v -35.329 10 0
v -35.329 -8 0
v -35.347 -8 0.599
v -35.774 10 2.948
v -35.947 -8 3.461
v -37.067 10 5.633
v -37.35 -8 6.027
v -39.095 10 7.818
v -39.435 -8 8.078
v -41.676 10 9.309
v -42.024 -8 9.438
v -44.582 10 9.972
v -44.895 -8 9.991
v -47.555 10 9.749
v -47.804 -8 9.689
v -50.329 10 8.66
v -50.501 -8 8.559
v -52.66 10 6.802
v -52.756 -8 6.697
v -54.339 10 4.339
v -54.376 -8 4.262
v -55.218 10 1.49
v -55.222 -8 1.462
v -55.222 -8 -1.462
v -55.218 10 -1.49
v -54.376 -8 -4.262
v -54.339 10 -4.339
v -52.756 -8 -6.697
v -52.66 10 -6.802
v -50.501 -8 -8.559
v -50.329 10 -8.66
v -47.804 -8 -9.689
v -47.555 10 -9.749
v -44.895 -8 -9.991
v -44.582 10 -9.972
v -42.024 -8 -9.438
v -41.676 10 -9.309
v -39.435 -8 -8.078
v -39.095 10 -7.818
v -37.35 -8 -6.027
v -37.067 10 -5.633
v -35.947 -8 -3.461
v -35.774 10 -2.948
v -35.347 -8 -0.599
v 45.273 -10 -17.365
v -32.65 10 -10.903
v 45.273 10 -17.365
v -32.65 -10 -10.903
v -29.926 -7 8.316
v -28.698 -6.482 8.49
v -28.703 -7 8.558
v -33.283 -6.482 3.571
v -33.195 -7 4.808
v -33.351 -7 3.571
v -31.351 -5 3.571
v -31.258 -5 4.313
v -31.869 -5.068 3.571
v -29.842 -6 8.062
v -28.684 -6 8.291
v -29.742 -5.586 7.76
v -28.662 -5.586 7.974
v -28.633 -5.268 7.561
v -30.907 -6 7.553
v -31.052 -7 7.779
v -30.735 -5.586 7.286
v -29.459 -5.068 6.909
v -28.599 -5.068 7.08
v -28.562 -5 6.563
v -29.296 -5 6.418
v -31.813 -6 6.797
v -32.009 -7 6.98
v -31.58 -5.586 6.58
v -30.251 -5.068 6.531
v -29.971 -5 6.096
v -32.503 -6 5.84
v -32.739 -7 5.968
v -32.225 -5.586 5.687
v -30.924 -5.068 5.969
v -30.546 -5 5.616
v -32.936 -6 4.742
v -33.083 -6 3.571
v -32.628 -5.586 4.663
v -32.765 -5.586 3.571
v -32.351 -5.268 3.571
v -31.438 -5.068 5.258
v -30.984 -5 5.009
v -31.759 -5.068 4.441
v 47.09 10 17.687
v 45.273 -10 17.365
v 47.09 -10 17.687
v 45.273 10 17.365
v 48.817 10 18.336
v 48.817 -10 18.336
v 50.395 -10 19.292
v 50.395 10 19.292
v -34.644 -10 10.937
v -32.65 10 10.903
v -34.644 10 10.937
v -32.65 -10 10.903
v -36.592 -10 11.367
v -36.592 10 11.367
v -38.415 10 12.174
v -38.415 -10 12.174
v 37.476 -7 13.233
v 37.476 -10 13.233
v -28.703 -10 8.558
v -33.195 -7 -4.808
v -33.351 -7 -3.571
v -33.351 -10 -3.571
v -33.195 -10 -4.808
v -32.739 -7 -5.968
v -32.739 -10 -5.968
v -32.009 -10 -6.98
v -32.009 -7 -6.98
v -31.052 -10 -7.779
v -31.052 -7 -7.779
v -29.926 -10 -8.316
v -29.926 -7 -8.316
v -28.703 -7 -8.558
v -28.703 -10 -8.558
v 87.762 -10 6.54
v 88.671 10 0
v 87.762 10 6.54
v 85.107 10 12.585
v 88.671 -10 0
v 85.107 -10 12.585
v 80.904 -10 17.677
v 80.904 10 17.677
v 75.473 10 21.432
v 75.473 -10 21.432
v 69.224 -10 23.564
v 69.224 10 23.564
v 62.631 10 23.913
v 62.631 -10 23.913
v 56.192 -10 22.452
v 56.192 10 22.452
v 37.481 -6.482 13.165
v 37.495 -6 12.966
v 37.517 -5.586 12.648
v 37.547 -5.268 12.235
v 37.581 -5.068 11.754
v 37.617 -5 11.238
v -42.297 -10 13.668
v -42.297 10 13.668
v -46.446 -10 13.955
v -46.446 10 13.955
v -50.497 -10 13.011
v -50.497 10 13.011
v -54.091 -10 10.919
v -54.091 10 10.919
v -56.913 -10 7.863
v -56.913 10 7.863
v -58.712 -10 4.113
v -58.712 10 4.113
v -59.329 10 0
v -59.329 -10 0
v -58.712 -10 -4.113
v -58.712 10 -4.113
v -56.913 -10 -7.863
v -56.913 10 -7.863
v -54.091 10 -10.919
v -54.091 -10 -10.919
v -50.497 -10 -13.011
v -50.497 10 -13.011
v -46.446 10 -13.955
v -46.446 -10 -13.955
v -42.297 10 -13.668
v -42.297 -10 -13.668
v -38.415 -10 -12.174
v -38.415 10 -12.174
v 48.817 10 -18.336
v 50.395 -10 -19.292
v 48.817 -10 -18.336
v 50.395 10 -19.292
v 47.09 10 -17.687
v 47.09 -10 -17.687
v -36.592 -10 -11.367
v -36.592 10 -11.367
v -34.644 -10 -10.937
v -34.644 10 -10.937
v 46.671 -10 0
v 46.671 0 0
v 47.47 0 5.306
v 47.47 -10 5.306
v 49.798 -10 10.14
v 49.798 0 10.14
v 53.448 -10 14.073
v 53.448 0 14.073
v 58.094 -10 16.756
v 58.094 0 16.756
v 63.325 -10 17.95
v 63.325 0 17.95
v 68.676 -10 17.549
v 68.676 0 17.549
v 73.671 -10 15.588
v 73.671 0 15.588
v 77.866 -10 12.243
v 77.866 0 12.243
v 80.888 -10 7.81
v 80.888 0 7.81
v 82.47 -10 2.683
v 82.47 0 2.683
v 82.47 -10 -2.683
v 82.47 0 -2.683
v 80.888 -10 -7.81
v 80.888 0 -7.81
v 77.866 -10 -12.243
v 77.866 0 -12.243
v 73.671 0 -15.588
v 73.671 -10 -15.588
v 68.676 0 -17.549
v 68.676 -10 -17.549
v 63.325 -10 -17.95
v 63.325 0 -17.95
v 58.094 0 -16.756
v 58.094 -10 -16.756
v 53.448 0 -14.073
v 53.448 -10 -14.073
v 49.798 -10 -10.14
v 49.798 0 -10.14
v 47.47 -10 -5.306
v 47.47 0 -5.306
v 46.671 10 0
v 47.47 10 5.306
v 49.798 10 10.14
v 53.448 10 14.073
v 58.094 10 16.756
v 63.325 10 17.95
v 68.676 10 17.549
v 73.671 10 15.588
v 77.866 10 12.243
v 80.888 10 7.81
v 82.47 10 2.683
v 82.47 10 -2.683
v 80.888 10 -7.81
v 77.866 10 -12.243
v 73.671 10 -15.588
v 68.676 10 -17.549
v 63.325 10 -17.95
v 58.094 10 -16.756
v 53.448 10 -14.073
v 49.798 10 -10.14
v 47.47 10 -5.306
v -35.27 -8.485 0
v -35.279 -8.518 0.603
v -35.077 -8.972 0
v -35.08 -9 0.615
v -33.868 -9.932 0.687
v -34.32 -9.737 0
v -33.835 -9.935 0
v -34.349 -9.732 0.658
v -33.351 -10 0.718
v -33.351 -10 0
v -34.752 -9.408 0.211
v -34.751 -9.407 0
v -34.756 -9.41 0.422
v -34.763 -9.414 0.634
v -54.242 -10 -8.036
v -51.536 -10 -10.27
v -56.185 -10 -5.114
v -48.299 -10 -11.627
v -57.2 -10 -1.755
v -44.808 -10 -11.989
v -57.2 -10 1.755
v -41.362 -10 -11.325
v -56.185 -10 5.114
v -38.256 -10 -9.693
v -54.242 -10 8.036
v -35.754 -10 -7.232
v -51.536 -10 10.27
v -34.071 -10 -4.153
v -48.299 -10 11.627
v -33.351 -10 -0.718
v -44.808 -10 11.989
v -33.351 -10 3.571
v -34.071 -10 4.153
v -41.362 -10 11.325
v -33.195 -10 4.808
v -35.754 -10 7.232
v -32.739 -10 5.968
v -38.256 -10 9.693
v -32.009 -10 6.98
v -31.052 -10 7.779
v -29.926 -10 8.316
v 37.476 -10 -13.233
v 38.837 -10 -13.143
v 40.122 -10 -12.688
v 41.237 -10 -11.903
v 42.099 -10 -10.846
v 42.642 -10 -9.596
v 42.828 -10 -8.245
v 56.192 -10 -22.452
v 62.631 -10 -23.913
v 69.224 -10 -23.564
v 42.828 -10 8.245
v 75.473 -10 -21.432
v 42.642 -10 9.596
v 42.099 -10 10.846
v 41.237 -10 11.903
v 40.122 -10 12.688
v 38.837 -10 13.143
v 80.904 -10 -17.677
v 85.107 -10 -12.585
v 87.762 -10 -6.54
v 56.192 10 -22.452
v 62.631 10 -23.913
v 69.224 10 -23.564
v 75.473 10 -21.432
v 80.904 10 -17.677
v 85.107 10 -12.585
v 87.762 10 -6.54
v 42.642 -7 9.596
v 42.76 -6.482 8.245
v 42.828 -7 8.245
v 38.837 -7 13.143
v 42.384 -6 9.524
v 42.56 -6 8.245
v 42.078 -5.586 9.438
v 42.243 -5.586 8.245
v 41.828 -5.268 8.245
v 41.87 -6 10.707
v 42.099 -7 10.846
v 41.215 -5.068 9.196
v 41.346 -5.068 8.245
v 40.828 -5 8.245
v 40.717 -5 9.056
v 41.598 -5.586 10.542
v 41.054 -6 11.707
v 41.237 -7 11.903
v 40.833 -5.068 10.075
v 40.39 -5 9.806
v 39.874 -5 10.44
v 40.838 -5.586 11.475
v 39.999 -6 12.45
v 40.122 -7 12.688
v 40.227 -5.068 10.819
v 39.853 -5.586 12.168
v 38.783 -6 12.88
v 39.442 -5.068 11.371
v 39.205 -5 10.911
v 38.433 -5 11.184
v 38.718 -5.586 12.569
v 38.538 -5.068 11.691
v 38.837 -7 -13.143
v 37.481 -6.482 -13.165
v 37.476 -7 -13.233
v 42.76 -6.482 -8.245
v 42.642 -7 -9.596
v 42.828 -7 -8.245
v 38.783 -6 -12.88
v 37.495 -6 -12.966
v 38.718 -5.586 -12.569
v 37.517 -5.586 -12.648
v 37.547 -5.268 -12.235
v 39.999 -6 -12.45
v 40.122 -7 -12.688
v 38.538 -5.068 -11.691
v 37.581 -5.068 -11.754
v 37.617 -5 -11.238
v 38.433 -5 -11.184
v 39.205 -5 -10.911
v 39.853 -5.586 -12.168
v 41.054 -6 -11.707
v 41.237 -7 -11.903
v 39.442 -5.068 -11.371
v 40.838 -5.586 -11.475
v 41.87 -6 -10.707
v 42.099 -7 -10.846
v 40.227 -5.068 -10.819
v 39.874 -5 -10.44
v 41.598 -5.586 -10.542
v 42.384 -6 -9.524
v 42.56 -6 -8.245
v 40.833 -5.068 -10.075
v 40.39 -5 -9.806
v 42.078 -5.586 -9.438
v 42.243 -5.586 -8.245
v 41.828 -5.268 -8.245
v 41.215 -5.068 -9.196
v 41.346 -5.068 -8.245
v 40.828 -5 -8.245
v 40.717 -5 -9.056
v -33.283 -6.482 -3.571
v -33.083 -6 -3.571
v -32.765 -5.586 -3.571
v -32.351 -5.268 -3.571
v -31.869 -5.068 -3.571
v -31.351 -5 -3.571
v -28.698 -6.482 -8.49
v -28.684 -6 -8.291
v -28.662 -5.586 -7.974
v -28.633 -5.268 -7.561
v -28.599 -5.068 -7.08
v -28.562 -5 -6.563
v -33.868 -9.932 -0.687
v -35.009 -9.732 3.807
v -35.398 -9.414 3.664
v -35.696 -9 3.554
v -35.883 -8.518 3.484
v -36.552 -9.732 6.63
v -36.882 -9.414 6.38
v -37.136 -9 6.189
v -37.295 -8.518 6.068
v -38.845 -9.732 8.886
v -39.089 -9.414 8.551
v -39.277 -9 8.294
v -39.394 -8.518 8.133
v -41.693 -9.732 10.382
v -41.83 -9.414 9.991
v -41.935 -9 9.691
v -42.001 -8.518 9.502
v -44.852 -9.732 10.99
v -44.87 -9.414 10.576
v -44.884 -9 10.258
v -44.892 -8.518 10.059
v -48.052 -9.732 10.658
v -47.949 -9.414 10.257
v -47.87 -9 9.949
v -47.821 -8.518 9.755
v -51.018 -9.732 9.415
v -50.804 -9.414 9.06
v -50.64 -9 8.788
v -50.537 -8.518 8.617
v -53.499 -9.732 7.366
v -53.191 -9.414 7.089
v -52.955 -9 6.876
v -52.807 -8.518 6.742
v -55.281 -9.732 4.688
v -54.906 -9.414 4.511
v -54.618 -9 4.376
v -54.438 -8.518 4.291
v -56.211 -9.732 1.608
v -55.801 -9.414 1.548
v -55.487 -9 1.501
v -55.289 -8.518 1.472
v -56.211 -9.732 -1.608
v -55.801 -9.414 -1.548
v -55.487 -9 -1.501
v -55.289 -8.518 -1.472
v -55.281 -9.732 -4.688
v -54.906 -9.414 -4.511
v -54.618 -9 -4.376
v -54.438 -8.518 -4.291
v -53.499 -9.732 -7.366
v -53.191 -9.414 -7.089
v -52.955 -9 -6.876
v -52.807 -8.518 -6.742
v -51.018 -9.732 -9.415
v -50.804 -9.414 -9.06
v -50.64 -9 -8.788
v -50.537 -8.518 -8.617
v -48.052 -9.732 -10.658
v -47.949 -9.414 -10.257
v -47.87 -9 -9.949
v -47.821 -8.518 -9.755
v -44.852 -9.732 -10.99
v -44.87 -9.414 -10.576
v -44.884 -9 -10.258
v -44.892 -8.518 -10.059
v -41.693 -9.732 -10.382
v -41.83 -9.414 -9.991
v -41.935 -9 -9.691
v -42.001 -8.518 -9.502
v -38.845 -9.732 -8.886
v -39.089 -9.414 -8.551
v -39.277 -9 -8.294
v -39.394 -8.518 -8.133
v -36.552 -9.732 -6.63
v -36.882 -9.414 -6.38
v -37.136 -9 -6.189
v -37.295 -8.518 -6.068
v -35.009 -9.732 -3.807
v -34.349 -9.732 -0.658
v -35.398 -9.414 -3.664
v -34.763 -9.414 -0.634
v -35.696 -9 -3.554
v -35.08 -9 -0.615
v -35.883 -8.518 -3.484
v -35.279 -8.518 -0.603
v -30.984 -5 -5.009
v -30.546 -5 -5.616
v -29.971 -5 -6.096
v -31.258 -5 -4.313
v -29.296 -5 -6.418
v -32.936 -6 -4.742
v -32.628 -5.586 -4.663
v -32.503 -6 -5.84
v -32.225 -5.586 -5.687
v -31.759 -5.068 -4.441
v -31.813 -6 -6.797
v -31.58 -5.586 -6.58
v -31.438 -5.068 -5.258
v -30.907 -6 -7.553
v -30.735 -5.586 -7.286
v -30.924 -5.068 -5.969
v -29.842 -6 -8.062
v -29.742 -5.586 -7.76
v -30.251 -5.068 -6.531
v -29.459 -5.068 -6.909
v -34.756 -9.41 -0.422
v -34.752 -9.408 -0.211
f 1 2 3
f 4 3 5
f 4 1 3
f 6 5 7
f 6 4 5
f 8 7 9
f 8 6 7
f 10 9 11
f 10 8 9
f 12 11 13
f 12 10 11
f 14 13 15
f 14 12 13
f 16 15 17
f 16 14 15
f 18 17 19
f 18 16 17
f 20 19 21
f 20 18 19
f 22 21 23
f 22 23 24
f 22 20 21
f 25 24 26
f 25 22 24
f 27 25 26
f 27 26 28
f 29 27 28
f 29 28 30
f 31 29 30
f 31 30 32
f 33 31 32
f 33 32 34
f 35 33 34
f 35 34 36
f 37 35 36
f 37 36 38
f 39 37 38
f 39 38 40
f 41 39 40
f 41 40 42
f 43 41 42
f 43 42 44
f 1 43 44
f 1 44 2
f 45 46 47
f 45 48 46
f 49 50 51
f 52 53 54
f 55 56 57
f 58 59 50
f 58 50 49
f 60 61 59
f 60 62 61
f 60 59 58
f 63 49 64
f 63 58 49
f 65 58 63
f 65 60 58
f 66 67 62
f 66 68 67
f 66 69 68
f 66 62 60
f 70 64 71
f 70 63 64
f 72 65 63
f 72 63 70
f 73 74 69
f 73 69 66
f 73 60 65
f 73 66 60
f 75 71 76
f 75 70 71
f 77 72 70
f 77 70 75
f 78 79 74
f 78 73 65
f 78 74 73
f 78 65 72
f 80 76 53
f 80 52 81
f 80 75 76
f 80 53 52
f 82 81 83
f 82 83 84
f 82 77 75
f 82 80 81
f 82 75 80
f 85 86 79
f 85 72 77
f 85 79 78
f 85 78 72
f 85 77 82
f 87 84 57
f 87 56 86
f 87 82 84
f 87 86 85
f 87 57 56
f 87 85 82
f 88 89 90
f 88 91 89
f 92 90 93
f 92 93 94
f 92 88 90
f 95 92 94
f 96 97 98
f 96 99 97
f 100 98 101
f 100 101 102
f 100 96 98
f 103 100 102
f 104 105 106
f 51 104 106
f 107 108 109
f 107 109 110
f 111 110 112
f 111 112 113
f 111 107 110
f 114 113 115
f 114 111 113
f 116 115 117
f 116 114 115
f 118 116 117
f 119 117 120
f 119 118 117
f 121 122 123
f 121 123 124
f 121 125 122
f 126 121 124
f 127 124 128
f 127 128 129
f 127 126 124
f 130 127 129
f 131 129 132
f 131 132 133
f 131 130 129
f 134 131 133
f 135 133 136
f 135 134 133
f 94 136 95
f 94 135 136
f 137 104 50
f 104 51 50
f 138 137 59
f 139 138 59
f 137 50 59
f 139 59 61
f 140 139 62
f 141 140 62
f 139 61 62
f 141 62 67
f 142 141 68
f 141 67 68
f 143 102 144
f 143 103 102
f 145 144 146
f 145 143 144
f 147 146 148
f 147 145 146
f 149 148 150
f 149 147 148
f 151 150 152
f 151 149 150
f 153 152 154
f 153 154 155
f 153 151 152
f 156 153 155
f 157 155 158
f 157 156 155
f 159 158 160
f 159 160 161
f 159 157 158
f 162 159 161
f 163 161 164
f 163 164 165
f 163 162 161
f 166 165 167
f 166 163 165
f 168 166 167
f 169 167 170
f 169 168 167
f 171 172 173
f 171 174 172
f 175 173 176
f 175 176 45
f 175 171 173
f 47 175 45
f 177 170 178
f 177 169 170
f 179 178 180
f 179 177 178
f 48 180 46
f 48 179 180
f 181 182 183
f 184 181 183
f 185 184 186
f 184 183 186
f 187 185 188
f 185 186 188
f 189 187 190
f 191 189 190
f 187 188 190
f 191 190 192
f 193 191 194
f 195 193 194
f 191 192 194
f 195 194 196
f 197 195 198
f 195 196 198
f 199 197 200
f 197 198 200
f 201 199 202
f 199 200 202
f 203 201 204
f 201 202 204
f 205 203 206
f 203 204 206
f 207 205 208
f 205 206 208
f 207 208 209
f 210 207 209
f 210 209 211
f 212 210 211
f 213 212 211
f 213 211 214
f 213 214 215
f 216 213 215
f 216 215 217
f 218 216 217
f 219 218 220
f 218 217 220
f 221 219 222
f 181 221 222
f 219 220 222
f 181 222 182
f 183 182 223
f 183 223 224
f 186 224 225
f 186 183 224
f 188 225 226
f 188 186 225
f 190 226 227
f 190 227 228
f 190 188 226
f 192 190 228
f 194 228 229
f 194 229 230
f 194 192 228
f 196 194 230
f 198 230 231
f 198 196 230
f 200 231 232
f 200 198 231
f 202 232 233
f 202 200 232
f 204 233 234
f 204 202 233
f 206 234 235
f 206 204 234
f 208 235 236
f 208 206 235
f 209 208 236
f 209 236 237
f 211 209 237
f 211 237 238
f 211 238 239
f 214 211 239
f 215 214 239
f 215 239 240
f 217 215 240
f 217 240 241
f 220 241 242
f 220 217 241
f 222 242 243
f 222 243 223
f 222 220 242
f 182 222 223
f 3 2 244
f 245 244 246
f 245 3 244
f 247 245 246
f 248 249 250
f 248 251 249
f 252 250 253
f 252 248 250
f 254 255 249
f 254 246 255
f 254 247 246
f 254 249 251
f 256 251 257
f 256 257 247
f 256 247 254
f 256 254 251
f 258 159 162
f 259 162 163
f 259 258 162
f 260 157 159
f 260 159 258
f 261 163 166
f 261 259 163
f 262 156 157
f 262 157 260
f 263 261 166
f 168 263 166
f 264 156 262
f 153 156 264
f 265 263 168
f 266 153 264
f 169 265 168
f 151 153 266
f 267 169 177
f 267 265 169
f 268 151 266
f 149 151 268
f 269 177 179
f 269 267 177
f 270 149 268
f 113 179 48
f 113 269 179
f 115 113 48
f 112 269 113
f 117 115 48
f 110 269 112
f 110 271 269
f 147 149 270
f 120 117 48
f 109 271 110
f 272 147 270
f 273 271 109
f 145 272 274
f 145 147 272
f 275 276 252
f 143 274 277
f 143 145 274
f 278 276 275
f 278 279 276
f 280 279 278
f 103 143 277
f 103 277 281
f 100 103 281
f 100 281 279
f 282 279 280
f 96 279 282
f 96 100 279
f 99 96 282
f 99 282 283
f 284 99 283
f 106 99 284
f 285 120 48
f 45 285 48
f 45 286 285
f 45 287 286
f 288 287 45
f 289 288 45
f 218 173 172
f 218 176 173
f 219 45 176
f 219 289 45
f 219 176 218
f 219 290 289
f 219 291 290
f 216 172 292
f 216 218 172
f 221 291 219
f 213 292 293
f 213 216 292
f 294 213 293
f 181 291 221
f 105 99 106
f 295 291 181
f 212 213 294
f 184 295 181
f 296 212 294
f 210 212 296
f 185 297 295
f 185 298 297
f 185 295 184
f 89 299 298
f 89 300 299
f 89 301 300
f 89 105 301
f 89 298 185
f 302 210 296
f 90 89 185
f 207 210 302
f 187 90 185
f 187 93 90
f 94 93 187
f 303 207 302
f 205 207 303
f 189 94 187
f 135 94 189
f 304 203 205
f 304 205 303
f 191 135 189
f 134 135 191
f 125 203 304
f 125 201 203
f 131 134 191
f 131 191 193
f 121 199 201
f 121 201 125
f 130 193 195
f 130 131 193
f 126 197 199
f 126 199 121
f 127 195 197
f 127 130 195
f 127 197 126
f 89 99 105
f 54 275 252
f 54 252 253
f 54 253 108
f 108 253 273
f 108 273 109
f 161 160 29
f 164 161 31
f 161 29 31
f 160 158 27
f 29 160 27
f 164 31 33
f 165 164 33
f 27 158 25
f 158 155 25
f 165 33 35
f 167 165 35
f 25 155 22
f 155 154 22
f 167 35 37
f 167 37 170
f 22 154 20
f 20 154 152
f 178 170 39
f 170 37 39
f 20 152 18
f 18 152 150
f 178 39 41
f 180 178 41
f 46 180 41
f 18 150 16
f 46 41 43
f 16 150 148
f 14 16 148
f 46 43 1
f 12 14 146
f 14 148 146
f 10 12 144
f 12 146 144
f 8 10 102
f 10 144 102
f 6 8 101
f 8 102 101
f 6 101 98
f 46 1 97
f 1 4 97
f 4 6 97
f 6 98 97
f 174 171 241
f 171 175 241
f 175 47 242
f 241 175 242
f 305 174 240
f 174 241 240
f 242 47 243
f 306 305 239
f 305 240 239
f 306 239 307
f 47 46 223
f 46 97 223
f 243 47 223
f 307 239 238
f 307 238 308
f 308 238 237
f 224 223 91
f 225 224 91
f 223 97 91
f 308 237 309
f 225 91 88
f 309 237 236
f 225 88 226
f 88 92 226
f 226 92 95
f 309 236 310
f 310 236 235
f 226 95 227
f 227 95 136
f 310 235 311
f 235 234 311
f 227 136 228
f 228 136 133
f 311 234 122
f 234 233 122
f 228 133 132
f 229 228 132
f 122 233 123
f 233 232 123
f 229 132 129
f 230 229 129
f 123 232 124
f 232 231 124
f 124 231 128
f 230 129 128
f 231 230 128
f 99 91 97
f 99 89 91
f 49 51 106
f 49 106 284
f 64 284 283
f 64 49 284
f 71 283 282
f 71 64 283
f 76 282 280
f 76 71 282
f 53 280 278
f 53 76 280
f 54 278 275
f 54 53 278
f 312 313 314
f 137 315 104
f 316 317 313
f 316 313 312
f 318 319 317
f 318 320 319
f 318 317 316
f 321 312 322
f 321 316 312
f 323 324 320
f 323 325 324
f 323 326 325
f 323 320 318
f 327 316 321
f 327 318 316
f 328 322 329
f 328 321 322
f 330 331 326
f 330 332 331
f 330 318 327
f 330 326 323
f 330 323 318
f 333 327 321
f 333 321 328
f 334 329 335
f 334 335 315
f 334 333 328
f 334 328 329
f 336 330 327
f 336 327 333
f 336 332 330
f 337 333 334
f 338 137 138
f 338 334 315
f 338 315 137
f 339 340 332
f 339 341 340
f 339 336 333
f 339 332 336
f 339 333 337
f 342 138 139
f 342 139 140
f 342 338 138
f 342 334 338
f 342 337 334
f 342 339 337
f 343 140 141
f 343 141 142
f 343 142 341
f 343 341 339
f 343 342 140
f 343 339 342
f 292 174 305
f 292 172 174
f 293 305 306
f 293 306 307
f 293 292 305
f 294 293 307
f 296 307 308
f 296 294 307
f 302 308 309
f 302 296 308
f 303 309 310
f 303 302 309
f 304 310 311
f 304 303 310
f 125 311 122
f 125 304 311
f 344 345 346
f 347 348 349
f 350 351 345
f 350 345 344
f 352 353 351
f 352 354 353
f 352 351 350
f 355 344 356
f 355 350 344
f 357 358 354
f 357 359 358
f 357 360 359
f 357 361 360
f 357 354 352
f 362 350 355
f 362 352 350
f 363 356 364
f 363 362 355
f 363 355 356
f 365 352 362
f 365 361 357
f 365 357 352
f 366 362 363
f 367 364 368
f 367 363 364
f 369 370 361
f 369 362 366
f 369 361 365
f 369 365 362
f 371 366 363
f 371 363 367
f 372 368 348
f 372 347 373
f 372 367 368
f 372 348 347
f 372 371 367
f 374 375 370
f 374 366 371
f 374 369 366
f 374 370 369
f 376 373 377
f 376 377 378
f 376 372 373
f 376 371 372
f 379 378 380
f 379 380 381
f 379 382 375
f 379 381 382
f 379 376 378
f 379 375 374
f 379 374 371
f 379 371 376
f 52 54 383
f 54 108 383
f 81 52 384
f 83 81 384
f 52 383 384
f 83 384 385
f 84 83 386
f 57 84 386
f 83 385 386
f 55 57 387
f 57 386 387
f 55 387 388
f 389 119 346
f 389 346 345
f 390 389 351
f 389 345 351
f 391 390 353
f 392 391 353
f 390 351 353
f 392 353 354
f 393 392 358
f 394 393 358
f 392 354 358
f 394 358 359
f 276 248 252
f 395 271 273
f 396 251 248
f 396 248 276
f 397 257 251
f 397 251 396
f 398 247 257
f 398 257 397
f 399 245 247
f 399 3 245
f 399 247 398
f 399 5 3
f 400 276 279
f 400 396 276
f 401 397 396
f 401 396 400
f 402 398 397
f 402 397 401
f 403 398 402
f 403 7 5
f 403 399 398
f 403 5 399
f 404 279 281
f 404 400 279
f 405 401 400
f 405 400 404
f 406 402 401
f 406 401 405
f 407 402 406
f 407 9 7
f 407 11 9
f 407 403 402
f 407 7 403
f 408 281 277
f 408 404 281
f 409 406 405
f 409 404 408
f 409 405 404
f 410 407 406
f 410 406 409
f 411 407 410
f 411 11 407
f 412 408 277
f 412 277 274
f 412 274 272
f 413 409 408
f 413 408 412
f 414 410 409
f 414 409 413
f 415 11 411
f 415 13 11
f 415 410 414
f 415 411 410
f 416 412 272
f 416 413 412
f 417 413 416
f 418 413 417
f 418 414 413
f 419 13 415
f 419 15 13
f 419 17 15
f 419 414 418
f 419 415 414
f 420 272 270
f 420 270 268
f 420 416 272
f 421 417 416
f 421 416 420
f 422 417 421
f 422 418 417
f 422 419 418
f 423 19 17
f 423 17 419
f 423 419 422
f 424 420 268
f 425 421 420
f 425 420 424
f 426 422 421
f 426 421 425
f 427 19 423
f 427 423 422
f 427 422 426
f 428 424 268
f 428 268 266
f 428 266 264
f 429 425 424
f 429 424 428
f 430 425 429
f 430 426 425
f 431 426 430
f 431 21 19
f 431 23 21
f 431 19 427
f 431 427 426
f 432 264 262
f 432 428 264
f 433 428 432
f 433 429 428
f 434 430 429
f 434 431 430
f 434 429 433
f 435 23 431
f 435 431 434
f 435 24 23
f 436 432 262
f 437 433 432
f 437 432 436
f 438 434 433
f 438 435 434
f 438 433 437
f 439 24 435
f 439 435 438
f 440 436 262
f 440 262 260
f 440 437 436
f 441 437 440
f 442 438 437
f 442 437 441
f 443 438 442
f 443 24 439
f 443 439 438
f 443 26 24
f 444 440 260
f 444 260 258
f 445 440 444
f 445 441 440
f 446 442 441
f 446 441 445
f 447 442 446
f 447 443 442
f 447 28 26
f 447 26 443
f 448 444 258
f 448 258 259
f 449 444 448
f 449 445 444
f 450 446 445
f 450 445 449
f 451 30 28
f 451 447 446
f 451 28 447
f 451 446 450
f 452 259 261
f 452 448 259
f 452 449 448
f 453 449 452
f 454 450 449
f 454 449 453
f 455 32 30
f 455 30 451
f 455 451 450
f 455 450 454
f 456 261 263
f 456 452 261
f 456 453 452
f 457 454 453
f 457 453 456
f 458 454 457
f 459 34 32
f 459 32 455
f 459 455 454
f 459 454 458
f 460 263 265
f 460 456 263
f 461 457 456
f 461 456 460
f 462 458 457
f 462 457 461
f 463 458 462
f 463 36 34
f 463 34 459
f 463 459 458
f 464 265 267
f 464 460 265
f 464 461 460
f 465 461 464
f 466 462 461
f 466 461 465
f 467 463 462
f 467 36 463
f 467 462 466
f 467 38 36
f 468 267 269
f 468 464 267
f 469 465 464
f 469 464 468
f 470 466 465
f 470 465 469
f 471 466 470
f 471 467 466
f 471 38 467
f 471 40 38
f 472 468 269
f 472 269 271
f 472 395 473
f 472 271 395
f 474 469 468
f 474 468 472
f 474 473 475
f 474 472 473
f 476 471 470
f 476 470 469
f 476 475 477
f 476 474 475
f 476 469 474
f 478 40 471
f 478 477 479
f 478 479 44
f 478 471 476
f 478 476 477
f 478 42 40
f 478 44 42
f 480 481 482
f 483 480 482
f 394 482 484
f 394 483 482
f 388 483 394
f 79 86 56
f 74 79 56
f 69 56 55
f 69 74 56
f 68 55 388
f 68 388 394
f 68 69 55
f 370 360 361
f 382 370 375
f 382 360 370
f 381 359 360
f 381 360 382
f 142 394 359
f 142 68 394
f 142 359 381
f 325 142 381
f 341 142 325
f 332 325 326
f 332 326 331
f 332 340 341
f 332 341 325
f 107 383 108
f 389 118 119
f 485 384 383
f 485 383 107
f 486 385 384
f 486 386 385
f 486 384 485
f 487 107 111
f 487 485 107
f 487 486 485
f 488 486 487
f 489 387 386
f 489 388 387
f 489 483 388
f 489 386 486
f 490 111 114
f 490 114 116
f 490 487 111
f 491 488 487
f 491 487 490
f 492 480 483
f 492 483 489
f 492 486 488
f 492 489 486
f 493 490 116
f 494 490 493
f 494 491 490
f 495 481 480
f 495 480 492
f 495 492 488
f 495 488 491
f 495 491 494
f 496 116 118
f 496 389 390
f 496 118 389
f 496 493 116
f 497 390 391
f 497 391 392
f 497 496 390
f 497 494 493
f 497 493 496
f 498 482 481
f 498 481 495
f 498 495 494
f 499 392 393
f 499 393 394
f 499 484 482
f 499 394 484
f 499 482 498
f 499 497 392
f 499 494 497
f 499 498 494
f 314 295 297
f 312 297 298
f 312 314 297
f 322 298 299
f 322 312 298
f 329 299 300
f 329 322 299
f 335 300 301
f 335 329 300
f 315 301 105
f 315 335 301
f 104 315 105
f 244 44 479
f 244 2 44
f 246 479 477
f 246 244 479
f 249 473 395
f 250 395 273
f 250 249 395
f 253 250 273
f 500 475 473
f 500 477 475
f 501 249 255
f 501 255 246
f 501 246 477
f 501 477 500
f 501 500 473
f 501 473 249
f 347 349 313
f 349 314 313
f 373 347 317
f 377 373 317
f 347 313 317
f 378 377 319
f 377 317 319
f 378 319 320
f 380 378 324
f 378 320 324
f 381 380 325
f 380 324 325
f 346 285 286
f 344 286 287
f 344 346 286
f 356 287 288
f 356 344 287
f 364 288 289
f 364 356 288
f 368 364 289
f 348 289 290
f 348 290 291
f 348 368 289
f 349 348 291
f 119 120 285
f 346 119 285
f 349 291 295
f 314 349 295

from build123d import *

# Parameters (mm, degrees)
F0_R     = 10
F1_DEPTH = 10
F2_R     = 10
F3_R     = 10
F5_DEPTH = 5
F6_R     = 5
F7_R     = 5
F8_R     = 2


with BuildPart() as f1:
    # F0 (on Front) → F1 (new body, symmetric)
    with BuildSketch(Plane.XZ):
        with BuildLine():
            ThreePointArc((-36.194757, 10.609343), (-32.603742, 5.835876), (-31.329407, 0))
            Line((-31.329407, 0), (40.670593, 0))
            ThreePointArc((40.670593, 0), (42.681766, 9.617248), (48.378215, 17.622667))
            Line((48.378215, 17.622667), (-36.194757, 10.609343))
        make_face()
        with BuildLine():
            Line((40.670593, 0), (-31.329407, 0))
            ThreePointArc((-31.329407, 0), (-32.603742, -5.835876), (-36.194757, -10.609343))
            Line((-36.194757, -10.609343), (48.378215, -17.622667))
            ThreePointArc((48.378215, -17.622667), (42.681766, -9.617248), (40.670593, 0))
        make_face()
        with BuildLine():
            ThreePointArc((48.378215, 17.622667), (42.681766, 9.617248), (40.670593, 0))
            ThreePointArc((40.670593, 0), (42.681766, -9.617248), (48.378215, -17.622667))
            ThreePointArc((48.378215, -17.622667), (74.287841, -21.988828), (88.670593, 0))
            ThreePointArc((88.670593, 0), (74.287841, 21.988828), (48.378215, 17.622667))
        make_face()
        with BuildLine():
            ThreePointArc((82.670593, 0), (64.670593, -18), (46.670593, 0))
            ThreePointArc((46.670593, 0), (64.670593, 18), (82.670593, 0))
        make_face(mode=Mode.SUBTRACT)
        with BuildLine():
            ThreePointArc((-36.194757, -10.609343), (-32.603742, -5.835876), (-31.329407, 0))
            ThreePointArc((-31.329407, 0), (-32.603742, 5.835876), (-36.194757, 10.609343))
            ThreePointArc((-36.194757, 10.609343), (-59.329407, 0), (-36.194757, -10.609343))
        make_face()
        with Locations((-45.329407, 0)):
            Circle(F0_R, mode=Mode.SUBTRACT)
    extrude(amount=F1_DEPTH, both=True)

    # F2
    f2_edges = [f1.edges().sort_by_distance(p)[0] for p in [
        (-36.194757, 0, 10.609343),
    ]]
    fillet(f2_edges, radius=F2_R)

    # F3
    f3_edges = [f1.edges().sort_by_distance(p)[0] for p in [
        (48.378215, 5, 17.622667),
        (48.378215, 5, -17.622667),
        (-36.194757, 0, -10.609343),
    ]]
    fillet(f3_edges, radius=F3_R)

    # F4 (on face) → F5 (cut)
    with BuildSketch(Plane.XZ.offset(10)):
        Polygon((42.828392, 13.610834), (-33.350925, 8.230139), (-33.350925, -8.230139), (42.828392, -13.610834), align=None)
    extrude(amount=-F5_DEPTH, mode=Mode.SUBTRACT)

    # F6
    f6_edges = [f1.edges().sort_by_distance(p)[0] for p in [
        (-33.350925, -7.5, 8.230139),
        (-33.350925, -7.5, -8.230139),
    ]]
    fillet(f6_edges, radius=F6_R)

    # F7
    f7_edges = [f1.edges().sort_by_distance(p)[0] for p in [
        (42.828392, -7.5, 13.610834),
        (42.828392, -7.5, -13.610834),
    ]]
    fillet(f7_edges, radius=F7_R)

    # F8
    f8_edges = [f1.edges().sort_by_distance(p)[0] for p in [
        (4.386452, -5, 10.895604),
        (-55.329407, -10, 0),
    ]]
    fillet(f8_edges, radius=F8_R)


solid = f1.part
